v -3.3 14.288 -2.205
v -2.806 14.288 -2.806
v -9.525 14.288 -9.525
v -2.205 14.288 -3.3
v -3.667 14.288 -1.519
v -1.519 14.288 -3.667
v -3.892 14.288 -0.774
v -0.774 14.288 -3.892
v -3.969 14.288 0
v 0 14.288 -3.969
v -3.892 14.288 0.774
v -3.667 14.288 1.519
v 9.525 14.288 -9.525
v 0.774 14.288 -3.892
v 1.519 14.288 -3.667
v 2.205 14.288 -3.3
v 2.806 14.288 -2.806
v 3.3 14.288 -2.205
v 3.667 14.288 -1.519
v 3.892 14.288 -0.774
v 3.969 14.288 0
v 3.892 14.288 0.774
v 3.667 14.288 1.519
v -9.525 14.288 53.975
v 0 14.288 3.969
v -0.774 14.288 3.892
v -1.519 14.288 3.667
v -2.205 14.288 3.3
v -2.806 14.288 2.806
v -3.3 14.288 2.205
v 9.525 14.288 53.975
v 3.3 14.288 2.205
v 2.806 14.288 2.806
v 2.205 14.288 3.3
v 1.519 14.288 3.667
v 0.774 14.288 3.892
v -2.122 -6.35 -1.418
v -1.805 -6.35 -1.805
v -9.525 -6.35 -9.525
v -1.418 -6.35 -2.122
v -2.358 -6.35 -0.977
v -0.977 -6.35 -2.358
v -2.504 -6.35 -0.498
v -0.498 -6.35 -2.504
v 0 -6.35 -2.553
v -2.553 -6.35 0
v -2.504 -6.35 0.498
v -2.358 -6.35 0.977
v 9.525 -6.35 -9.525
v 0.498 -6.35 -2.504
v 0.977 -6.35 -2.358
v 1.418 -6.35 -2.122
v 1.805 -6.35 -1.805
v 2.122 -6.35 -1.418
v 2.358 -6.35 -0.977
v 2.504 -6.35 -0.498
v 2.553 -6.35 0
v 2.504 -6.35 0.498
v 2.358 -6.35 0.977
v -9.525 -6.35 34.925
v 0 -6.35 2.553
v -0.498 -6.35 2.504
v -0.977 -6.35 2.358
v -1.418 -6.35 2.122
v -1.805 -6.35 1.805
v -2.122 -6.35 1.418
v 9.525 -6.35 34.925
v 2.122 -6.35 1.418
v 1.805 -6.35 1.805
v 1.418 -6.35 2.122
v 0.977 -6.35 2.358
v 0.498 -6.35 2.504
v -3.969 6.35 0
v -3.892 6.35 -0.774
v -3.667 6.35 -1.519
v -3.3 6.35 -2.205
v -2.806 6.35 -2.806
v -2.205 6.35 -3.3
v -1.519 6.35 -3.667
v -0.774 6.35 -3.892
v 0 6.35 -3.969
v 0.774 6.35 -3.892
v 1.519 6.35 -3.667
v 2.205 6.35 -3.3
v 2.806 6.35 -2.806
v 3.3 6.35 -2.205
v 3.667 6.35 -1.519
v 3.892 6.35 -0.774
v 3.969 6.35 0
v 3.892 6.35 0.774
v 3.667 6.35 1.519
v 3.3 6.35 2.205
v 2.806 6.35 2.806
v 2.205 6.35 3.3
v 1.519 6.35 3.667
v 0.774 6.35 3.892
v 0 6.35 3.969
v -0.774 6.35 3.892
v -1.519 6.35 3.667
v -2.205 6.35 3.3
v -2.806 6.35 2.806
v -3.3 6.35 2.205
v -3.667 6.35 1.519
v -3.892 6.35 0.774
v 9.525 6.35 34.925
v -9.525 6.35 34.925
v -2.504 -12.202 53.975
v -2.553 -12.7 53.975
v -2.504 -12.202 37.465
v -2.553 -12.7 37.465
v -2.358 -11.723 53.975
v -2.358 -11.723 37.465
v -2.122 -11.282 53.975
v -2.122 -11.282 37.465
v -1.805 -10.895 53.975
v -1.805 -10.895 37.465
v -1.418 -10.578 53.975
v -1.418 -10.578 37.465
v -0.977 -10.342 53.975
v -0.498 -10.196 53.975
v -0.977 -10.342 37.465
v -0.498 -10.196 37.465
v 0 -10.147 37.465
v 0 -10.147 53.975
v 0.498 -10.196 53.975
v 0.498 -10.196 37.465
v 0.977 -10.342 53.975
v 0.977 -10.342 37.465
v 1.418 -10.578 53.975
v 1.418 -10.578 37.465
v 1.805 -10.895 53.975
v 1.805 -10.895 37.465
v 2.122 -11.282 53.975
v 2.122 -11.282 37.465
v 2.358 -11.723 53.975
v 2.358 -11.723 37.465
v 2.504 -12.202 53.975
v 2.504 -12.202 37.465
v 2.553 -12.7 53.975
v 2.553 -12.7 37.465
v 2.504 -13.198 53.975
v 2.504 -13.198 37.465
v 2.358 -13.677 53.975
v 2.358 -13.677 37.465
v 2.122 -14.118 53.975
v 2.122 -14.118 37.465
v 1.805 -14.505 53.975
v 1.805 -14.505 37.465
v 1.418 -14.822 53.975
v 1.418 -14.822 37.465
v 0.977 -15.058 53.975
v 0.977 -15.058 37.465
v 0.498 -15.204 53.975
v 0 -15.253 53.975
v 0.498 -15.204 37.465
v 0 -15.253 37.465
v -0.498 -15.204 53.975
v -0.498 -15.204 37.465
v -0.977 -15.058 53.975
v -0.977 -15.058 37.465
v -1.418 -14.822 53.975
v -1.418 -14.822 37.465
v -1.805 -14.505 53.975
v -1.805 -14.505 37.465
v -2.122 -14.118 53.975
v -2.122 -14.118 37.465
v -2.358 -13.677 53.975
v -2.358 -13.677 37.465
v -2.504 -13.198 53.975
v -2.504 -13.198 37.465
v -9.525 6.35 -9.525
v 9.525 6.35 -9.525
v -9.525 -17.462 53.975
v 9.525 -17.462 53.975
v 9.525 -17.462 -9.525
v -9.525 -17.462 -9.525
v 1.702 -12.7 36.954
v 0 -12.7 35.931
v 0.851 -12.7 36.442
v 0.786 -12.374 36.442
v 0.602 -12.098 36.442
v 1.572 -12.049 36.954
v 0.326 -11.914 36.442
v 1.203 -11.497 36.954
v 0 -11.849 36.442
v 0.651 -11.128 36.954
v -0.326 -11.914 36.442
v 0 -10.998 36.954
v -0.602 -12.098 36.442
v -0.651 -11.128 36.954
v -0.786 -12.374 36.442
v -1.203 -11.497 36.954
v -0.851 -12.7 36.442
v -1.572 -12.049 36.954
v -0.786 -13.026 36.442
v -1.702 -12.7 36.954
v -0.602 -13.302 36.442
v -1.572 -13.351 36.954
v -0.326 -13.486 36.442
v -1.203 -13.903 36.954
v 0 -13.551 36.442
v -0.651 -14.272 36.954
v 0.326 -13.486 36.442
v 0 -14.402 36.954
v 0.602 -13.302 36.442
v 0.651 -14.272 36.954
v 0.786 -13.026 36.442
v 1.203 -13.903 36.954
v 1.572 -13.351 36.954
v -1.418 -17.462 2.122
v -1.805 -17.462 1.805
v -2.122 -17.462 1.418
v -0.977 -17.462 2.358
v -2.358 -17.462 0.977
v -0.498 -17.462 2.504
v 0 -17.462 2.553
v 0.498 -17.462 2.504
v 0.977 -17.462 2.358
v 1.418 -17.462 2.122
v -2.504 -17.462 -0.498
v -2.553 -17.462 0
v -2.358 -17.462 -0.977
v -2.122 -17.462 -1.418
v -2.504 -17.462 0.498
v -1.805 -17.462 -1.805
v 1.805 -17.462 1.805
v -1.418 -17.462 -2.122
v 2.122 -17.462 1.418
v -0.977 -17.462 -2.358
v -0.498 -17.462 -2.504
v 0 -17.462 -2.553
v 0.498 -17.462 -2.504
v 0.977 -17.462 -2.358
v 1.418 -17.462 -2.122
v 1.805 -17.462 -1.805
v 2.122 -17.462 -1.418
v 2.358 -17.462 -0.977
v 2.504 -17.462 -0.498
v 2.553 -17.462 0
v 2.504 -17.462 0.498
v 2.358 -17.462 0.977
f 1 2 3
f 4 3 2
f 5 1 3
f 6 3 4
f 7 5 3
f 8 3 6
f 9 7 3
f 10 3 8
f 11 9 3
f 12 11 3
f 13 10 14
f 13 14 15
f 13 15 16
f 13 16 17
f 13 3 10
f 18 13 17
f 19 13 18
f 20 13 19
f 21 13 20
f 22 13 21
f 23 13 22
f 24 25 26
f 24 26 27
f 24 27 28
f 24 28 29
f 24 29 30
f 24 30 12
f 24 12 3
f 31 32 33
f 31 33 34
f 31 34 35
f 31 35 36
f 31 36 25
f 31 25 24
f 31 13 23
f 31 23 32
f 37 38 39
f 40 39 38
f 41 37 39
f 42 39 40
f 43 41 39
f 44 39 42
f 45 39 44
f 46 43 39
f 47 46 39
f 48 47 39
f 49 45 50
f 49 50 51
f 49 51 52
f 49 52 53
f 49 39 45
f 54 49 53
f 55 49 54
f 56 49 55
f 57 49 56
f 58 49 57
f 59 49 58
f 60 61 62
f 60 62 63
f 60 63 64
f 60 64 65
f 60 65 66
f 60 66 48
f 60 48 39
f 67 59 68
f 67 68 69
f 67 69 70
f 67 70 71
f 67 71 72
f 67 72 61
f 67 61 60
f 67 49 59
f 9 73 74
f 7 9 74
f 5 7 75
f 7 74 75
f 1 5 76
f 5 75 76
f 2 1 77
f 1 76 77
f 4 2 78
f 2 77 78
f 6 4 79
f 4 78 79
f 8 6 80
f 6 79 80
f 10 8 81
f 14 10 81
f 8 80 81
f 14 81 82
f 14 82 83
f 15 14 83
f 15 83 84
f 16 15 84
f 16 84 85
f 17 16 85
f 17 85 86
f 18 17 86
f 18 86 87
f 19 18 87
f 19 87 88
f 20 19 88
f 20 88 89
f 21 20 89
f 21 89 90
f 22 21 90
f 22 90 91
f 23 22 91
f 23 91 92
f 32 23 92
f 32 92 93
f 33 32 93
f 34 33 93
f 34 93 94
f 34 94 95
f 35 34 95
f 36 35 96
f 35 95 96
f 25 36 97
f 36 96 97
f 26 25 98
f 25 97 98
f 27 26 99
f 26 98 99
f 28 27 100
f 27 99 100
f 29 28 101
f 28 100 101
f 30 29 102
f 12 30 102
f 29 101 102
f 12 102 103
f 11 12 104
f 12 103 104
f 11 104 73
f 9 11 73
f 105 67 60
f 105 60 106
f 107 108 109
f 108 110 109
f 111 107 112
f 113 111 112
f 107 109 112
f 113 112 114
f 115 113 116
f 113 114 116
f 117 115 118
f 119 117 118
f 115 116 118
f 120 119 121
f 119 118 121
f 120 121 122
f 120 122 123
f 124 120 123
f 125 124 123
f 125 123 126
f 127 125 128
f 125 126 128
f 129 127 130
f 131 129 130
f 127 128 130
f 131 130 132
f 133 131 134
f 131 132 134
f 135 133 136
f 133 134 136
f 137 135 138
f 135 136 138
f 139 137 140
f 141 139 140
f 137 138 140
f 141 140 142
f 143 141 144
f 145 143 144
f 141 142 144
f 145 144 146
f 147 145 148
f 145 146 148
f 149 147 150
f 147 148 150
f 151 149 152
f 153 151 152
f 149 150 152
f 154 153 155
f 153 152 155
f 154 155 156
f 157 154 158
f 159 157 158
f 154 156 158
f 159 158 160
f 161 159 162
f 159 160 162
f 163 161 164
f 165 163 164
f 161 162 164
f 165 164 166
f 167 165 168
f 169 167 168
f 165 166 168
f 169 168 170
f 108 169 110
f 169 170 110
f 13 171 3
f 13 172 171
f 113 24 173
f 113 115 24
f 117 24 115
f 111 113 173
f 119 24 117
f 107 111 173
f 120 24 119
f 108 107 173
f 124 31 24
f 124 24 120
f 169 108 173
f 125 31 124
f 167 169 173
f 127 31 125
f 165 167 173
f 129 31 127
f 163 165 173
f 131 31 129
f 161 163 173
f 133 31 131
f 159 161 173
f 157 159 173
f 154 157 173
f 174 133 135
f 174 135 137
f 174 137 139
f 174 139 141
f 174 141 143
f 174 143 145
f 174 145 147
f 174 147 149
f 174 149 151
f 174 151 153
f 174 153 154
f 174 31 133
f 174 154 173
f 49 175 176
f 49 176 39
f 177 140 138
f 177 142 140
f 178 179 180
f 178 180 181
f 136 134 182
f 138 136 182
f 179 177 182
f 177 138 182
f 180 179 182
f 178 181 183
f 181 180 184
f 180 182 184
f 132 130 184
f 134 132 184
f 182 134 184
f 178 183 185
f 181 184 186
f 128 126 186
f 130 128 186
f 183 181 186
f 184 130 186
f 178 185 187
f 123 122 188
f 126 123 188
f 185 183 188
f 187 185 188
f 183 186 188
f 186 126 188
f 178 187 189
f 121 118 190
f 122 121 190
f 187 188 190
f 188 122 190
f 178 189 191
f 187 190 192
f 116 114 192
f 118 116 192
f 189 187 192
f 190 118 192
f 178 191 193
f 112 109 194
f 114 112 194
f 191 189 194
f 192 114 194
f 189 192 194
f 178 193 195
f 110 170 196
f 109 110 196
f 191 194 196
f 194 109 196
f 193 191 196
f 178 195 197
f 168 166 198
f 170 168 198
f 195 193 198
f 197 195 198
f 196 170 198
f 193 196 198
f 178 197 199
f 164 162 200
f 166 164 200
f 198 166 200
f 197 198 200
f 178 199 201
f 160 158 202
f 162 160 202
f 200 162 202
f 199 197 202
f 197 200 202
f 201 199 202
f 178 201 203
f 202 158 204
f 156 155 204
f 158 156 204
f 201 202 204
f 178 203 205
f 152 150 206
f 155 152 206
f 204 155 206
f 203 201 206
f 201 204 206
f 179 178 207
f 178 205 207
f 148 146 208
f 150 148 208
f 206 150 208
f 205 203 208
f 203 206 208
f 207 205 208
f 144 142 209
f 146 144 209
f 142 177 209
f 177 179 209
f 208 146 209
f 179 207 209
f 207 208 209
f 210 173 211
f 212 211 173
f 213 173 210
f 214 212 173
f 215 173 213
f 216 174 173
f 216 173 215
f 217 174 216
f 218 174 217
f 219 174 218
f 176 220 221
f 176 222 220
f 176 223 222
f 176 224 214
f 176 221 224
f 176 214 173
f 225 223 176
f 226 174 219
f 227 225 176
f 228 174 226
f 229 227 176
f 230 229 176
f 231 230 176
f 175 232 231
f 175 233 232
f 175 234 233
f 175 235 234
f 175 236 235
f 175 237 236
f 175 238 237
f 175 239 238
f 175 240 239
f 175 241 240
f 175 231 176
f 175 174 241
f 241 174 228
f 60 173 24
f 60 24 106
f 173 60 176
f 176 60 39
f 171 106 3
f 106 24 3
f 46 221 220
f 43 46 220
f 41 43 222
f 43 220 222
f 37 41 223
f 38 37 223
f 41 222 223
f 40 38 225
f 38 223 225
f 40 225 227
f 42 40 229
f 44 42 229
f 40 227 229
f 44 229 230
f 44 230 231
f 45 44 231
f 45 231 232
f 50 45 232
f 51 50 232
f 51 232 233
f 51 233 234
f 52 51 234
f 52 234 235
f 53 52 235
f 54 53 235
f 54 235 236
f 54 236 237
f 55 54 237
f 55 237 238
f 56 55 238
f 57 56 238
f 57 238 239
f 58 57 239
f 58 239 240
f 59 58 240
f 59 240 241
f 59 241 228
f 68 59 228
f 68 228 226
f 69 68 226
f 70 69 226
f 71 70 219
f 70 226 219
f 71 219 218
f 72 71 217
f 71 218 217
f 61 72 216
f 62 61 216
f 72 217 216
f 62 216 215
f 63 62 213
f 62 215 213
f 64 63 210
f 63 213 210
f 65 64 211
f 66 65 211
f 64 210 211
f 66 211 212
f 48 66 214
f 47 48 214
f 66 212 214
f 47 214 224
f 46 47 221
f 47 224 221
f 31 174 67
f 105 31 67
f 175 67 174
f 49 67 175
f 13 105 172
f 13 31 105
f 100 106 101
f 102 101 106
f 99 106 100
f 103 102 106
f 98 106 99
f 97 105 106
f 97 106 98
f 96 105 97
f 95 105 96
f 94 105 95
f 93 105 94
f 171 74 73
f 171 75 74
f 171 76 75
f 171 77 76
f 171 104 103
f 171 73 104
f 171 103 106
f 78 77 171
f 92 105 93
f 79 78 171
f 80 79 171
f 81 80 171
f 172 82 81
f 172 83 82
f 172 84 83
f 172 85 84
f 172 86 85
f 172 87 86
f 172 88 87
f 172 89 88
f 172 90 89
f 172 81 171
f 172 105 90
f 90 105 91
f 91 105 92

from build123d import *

# Parameters (mm, degrees)
BOSS_EXTRUDE1_DEPTH                = 9.525
F_1_4_20_TAPPED_HOLE1_D            = 5.1054
F_5_16_0_3125_DIAMETER_HOLE1_D     = 7.9375
F_5_16_0_3125_DIAMETER_HOLE1_DEPTH = 20.6365
F_1_4_20_TAPPED_HOLE2_D            = 5.1054
F_1_4_20_TAPPED_HOLE2_DEPTH        = 16.51
F_1_4_20_TAPPED_HOLE2_TIP          = 1.533816902


with BuildPart() as part:
    # Sketch3 → Boss-Extrude1 (new, symmetric)
    with BuildSketch(Plane(origin=(0, 0, 0), x_dir=(0, 0, -1), z_dir=(1, 0, 0))):
        Polygon((-53.975, 14.2875), (-53.975, -17.4625), (9.525, -17.4625), (9.525, -6.35), (-34.925, -6.35), (-34.925, 6.35), (9.525, 6.35), (9.525, 14.2875), align=None)
    extrude(amount=BOSS_EXTRUDE1_DEPTH, both=True)

    # 1/4-20 Tapped Hole1 (through all)
    with Locations(Plane(origin=(0, 14.2875, 0), x_dir=(1, 0, 0), z_dir=(0, 1, 0))):
        with Locations((0, 0)):
            Hole(F_1_4_20_TAPPED_HOLE1_D / 2)

    # 5/16 (0.3125) Diameter Hole1
    with Locations(Plane(origin=(0, 14.2875, 0), x_dir=(1, 0, 0), z_dir=(0, 1, 0))):
        with Locations((0, 0)):
            Hole(F_5_16_0_3125_DIAMETER_HOLE1_D / 2, depth=F_5_16_0_3125_DIAMETER_HOLE1_DEPTH)

    # 1/4-20 Tapped Hole2
    with Locations(Plane.XY.offset(53.975)):
        with Locations((0, -12.7)):
            Hole(F_1_4_20_TAPPED_HOLE2_D / 2, depth=F_1_4_20_TAPPED_HOLE2_DEPTH)
            with Locations((0, 0, -(F_1_4_20_TAPPED_HOLE2_DEPTH + F_1_4_20_TAPPED_HOLE2_TIP / 2))):  # 118° drill point
                Cone(0, F_1_4_20_TAPPED_HOLE2_D / 2, F_1_4_20_TAPPED_HOLE2_TIP, mode=Mode.SUBTRACT)


solid = part.part
